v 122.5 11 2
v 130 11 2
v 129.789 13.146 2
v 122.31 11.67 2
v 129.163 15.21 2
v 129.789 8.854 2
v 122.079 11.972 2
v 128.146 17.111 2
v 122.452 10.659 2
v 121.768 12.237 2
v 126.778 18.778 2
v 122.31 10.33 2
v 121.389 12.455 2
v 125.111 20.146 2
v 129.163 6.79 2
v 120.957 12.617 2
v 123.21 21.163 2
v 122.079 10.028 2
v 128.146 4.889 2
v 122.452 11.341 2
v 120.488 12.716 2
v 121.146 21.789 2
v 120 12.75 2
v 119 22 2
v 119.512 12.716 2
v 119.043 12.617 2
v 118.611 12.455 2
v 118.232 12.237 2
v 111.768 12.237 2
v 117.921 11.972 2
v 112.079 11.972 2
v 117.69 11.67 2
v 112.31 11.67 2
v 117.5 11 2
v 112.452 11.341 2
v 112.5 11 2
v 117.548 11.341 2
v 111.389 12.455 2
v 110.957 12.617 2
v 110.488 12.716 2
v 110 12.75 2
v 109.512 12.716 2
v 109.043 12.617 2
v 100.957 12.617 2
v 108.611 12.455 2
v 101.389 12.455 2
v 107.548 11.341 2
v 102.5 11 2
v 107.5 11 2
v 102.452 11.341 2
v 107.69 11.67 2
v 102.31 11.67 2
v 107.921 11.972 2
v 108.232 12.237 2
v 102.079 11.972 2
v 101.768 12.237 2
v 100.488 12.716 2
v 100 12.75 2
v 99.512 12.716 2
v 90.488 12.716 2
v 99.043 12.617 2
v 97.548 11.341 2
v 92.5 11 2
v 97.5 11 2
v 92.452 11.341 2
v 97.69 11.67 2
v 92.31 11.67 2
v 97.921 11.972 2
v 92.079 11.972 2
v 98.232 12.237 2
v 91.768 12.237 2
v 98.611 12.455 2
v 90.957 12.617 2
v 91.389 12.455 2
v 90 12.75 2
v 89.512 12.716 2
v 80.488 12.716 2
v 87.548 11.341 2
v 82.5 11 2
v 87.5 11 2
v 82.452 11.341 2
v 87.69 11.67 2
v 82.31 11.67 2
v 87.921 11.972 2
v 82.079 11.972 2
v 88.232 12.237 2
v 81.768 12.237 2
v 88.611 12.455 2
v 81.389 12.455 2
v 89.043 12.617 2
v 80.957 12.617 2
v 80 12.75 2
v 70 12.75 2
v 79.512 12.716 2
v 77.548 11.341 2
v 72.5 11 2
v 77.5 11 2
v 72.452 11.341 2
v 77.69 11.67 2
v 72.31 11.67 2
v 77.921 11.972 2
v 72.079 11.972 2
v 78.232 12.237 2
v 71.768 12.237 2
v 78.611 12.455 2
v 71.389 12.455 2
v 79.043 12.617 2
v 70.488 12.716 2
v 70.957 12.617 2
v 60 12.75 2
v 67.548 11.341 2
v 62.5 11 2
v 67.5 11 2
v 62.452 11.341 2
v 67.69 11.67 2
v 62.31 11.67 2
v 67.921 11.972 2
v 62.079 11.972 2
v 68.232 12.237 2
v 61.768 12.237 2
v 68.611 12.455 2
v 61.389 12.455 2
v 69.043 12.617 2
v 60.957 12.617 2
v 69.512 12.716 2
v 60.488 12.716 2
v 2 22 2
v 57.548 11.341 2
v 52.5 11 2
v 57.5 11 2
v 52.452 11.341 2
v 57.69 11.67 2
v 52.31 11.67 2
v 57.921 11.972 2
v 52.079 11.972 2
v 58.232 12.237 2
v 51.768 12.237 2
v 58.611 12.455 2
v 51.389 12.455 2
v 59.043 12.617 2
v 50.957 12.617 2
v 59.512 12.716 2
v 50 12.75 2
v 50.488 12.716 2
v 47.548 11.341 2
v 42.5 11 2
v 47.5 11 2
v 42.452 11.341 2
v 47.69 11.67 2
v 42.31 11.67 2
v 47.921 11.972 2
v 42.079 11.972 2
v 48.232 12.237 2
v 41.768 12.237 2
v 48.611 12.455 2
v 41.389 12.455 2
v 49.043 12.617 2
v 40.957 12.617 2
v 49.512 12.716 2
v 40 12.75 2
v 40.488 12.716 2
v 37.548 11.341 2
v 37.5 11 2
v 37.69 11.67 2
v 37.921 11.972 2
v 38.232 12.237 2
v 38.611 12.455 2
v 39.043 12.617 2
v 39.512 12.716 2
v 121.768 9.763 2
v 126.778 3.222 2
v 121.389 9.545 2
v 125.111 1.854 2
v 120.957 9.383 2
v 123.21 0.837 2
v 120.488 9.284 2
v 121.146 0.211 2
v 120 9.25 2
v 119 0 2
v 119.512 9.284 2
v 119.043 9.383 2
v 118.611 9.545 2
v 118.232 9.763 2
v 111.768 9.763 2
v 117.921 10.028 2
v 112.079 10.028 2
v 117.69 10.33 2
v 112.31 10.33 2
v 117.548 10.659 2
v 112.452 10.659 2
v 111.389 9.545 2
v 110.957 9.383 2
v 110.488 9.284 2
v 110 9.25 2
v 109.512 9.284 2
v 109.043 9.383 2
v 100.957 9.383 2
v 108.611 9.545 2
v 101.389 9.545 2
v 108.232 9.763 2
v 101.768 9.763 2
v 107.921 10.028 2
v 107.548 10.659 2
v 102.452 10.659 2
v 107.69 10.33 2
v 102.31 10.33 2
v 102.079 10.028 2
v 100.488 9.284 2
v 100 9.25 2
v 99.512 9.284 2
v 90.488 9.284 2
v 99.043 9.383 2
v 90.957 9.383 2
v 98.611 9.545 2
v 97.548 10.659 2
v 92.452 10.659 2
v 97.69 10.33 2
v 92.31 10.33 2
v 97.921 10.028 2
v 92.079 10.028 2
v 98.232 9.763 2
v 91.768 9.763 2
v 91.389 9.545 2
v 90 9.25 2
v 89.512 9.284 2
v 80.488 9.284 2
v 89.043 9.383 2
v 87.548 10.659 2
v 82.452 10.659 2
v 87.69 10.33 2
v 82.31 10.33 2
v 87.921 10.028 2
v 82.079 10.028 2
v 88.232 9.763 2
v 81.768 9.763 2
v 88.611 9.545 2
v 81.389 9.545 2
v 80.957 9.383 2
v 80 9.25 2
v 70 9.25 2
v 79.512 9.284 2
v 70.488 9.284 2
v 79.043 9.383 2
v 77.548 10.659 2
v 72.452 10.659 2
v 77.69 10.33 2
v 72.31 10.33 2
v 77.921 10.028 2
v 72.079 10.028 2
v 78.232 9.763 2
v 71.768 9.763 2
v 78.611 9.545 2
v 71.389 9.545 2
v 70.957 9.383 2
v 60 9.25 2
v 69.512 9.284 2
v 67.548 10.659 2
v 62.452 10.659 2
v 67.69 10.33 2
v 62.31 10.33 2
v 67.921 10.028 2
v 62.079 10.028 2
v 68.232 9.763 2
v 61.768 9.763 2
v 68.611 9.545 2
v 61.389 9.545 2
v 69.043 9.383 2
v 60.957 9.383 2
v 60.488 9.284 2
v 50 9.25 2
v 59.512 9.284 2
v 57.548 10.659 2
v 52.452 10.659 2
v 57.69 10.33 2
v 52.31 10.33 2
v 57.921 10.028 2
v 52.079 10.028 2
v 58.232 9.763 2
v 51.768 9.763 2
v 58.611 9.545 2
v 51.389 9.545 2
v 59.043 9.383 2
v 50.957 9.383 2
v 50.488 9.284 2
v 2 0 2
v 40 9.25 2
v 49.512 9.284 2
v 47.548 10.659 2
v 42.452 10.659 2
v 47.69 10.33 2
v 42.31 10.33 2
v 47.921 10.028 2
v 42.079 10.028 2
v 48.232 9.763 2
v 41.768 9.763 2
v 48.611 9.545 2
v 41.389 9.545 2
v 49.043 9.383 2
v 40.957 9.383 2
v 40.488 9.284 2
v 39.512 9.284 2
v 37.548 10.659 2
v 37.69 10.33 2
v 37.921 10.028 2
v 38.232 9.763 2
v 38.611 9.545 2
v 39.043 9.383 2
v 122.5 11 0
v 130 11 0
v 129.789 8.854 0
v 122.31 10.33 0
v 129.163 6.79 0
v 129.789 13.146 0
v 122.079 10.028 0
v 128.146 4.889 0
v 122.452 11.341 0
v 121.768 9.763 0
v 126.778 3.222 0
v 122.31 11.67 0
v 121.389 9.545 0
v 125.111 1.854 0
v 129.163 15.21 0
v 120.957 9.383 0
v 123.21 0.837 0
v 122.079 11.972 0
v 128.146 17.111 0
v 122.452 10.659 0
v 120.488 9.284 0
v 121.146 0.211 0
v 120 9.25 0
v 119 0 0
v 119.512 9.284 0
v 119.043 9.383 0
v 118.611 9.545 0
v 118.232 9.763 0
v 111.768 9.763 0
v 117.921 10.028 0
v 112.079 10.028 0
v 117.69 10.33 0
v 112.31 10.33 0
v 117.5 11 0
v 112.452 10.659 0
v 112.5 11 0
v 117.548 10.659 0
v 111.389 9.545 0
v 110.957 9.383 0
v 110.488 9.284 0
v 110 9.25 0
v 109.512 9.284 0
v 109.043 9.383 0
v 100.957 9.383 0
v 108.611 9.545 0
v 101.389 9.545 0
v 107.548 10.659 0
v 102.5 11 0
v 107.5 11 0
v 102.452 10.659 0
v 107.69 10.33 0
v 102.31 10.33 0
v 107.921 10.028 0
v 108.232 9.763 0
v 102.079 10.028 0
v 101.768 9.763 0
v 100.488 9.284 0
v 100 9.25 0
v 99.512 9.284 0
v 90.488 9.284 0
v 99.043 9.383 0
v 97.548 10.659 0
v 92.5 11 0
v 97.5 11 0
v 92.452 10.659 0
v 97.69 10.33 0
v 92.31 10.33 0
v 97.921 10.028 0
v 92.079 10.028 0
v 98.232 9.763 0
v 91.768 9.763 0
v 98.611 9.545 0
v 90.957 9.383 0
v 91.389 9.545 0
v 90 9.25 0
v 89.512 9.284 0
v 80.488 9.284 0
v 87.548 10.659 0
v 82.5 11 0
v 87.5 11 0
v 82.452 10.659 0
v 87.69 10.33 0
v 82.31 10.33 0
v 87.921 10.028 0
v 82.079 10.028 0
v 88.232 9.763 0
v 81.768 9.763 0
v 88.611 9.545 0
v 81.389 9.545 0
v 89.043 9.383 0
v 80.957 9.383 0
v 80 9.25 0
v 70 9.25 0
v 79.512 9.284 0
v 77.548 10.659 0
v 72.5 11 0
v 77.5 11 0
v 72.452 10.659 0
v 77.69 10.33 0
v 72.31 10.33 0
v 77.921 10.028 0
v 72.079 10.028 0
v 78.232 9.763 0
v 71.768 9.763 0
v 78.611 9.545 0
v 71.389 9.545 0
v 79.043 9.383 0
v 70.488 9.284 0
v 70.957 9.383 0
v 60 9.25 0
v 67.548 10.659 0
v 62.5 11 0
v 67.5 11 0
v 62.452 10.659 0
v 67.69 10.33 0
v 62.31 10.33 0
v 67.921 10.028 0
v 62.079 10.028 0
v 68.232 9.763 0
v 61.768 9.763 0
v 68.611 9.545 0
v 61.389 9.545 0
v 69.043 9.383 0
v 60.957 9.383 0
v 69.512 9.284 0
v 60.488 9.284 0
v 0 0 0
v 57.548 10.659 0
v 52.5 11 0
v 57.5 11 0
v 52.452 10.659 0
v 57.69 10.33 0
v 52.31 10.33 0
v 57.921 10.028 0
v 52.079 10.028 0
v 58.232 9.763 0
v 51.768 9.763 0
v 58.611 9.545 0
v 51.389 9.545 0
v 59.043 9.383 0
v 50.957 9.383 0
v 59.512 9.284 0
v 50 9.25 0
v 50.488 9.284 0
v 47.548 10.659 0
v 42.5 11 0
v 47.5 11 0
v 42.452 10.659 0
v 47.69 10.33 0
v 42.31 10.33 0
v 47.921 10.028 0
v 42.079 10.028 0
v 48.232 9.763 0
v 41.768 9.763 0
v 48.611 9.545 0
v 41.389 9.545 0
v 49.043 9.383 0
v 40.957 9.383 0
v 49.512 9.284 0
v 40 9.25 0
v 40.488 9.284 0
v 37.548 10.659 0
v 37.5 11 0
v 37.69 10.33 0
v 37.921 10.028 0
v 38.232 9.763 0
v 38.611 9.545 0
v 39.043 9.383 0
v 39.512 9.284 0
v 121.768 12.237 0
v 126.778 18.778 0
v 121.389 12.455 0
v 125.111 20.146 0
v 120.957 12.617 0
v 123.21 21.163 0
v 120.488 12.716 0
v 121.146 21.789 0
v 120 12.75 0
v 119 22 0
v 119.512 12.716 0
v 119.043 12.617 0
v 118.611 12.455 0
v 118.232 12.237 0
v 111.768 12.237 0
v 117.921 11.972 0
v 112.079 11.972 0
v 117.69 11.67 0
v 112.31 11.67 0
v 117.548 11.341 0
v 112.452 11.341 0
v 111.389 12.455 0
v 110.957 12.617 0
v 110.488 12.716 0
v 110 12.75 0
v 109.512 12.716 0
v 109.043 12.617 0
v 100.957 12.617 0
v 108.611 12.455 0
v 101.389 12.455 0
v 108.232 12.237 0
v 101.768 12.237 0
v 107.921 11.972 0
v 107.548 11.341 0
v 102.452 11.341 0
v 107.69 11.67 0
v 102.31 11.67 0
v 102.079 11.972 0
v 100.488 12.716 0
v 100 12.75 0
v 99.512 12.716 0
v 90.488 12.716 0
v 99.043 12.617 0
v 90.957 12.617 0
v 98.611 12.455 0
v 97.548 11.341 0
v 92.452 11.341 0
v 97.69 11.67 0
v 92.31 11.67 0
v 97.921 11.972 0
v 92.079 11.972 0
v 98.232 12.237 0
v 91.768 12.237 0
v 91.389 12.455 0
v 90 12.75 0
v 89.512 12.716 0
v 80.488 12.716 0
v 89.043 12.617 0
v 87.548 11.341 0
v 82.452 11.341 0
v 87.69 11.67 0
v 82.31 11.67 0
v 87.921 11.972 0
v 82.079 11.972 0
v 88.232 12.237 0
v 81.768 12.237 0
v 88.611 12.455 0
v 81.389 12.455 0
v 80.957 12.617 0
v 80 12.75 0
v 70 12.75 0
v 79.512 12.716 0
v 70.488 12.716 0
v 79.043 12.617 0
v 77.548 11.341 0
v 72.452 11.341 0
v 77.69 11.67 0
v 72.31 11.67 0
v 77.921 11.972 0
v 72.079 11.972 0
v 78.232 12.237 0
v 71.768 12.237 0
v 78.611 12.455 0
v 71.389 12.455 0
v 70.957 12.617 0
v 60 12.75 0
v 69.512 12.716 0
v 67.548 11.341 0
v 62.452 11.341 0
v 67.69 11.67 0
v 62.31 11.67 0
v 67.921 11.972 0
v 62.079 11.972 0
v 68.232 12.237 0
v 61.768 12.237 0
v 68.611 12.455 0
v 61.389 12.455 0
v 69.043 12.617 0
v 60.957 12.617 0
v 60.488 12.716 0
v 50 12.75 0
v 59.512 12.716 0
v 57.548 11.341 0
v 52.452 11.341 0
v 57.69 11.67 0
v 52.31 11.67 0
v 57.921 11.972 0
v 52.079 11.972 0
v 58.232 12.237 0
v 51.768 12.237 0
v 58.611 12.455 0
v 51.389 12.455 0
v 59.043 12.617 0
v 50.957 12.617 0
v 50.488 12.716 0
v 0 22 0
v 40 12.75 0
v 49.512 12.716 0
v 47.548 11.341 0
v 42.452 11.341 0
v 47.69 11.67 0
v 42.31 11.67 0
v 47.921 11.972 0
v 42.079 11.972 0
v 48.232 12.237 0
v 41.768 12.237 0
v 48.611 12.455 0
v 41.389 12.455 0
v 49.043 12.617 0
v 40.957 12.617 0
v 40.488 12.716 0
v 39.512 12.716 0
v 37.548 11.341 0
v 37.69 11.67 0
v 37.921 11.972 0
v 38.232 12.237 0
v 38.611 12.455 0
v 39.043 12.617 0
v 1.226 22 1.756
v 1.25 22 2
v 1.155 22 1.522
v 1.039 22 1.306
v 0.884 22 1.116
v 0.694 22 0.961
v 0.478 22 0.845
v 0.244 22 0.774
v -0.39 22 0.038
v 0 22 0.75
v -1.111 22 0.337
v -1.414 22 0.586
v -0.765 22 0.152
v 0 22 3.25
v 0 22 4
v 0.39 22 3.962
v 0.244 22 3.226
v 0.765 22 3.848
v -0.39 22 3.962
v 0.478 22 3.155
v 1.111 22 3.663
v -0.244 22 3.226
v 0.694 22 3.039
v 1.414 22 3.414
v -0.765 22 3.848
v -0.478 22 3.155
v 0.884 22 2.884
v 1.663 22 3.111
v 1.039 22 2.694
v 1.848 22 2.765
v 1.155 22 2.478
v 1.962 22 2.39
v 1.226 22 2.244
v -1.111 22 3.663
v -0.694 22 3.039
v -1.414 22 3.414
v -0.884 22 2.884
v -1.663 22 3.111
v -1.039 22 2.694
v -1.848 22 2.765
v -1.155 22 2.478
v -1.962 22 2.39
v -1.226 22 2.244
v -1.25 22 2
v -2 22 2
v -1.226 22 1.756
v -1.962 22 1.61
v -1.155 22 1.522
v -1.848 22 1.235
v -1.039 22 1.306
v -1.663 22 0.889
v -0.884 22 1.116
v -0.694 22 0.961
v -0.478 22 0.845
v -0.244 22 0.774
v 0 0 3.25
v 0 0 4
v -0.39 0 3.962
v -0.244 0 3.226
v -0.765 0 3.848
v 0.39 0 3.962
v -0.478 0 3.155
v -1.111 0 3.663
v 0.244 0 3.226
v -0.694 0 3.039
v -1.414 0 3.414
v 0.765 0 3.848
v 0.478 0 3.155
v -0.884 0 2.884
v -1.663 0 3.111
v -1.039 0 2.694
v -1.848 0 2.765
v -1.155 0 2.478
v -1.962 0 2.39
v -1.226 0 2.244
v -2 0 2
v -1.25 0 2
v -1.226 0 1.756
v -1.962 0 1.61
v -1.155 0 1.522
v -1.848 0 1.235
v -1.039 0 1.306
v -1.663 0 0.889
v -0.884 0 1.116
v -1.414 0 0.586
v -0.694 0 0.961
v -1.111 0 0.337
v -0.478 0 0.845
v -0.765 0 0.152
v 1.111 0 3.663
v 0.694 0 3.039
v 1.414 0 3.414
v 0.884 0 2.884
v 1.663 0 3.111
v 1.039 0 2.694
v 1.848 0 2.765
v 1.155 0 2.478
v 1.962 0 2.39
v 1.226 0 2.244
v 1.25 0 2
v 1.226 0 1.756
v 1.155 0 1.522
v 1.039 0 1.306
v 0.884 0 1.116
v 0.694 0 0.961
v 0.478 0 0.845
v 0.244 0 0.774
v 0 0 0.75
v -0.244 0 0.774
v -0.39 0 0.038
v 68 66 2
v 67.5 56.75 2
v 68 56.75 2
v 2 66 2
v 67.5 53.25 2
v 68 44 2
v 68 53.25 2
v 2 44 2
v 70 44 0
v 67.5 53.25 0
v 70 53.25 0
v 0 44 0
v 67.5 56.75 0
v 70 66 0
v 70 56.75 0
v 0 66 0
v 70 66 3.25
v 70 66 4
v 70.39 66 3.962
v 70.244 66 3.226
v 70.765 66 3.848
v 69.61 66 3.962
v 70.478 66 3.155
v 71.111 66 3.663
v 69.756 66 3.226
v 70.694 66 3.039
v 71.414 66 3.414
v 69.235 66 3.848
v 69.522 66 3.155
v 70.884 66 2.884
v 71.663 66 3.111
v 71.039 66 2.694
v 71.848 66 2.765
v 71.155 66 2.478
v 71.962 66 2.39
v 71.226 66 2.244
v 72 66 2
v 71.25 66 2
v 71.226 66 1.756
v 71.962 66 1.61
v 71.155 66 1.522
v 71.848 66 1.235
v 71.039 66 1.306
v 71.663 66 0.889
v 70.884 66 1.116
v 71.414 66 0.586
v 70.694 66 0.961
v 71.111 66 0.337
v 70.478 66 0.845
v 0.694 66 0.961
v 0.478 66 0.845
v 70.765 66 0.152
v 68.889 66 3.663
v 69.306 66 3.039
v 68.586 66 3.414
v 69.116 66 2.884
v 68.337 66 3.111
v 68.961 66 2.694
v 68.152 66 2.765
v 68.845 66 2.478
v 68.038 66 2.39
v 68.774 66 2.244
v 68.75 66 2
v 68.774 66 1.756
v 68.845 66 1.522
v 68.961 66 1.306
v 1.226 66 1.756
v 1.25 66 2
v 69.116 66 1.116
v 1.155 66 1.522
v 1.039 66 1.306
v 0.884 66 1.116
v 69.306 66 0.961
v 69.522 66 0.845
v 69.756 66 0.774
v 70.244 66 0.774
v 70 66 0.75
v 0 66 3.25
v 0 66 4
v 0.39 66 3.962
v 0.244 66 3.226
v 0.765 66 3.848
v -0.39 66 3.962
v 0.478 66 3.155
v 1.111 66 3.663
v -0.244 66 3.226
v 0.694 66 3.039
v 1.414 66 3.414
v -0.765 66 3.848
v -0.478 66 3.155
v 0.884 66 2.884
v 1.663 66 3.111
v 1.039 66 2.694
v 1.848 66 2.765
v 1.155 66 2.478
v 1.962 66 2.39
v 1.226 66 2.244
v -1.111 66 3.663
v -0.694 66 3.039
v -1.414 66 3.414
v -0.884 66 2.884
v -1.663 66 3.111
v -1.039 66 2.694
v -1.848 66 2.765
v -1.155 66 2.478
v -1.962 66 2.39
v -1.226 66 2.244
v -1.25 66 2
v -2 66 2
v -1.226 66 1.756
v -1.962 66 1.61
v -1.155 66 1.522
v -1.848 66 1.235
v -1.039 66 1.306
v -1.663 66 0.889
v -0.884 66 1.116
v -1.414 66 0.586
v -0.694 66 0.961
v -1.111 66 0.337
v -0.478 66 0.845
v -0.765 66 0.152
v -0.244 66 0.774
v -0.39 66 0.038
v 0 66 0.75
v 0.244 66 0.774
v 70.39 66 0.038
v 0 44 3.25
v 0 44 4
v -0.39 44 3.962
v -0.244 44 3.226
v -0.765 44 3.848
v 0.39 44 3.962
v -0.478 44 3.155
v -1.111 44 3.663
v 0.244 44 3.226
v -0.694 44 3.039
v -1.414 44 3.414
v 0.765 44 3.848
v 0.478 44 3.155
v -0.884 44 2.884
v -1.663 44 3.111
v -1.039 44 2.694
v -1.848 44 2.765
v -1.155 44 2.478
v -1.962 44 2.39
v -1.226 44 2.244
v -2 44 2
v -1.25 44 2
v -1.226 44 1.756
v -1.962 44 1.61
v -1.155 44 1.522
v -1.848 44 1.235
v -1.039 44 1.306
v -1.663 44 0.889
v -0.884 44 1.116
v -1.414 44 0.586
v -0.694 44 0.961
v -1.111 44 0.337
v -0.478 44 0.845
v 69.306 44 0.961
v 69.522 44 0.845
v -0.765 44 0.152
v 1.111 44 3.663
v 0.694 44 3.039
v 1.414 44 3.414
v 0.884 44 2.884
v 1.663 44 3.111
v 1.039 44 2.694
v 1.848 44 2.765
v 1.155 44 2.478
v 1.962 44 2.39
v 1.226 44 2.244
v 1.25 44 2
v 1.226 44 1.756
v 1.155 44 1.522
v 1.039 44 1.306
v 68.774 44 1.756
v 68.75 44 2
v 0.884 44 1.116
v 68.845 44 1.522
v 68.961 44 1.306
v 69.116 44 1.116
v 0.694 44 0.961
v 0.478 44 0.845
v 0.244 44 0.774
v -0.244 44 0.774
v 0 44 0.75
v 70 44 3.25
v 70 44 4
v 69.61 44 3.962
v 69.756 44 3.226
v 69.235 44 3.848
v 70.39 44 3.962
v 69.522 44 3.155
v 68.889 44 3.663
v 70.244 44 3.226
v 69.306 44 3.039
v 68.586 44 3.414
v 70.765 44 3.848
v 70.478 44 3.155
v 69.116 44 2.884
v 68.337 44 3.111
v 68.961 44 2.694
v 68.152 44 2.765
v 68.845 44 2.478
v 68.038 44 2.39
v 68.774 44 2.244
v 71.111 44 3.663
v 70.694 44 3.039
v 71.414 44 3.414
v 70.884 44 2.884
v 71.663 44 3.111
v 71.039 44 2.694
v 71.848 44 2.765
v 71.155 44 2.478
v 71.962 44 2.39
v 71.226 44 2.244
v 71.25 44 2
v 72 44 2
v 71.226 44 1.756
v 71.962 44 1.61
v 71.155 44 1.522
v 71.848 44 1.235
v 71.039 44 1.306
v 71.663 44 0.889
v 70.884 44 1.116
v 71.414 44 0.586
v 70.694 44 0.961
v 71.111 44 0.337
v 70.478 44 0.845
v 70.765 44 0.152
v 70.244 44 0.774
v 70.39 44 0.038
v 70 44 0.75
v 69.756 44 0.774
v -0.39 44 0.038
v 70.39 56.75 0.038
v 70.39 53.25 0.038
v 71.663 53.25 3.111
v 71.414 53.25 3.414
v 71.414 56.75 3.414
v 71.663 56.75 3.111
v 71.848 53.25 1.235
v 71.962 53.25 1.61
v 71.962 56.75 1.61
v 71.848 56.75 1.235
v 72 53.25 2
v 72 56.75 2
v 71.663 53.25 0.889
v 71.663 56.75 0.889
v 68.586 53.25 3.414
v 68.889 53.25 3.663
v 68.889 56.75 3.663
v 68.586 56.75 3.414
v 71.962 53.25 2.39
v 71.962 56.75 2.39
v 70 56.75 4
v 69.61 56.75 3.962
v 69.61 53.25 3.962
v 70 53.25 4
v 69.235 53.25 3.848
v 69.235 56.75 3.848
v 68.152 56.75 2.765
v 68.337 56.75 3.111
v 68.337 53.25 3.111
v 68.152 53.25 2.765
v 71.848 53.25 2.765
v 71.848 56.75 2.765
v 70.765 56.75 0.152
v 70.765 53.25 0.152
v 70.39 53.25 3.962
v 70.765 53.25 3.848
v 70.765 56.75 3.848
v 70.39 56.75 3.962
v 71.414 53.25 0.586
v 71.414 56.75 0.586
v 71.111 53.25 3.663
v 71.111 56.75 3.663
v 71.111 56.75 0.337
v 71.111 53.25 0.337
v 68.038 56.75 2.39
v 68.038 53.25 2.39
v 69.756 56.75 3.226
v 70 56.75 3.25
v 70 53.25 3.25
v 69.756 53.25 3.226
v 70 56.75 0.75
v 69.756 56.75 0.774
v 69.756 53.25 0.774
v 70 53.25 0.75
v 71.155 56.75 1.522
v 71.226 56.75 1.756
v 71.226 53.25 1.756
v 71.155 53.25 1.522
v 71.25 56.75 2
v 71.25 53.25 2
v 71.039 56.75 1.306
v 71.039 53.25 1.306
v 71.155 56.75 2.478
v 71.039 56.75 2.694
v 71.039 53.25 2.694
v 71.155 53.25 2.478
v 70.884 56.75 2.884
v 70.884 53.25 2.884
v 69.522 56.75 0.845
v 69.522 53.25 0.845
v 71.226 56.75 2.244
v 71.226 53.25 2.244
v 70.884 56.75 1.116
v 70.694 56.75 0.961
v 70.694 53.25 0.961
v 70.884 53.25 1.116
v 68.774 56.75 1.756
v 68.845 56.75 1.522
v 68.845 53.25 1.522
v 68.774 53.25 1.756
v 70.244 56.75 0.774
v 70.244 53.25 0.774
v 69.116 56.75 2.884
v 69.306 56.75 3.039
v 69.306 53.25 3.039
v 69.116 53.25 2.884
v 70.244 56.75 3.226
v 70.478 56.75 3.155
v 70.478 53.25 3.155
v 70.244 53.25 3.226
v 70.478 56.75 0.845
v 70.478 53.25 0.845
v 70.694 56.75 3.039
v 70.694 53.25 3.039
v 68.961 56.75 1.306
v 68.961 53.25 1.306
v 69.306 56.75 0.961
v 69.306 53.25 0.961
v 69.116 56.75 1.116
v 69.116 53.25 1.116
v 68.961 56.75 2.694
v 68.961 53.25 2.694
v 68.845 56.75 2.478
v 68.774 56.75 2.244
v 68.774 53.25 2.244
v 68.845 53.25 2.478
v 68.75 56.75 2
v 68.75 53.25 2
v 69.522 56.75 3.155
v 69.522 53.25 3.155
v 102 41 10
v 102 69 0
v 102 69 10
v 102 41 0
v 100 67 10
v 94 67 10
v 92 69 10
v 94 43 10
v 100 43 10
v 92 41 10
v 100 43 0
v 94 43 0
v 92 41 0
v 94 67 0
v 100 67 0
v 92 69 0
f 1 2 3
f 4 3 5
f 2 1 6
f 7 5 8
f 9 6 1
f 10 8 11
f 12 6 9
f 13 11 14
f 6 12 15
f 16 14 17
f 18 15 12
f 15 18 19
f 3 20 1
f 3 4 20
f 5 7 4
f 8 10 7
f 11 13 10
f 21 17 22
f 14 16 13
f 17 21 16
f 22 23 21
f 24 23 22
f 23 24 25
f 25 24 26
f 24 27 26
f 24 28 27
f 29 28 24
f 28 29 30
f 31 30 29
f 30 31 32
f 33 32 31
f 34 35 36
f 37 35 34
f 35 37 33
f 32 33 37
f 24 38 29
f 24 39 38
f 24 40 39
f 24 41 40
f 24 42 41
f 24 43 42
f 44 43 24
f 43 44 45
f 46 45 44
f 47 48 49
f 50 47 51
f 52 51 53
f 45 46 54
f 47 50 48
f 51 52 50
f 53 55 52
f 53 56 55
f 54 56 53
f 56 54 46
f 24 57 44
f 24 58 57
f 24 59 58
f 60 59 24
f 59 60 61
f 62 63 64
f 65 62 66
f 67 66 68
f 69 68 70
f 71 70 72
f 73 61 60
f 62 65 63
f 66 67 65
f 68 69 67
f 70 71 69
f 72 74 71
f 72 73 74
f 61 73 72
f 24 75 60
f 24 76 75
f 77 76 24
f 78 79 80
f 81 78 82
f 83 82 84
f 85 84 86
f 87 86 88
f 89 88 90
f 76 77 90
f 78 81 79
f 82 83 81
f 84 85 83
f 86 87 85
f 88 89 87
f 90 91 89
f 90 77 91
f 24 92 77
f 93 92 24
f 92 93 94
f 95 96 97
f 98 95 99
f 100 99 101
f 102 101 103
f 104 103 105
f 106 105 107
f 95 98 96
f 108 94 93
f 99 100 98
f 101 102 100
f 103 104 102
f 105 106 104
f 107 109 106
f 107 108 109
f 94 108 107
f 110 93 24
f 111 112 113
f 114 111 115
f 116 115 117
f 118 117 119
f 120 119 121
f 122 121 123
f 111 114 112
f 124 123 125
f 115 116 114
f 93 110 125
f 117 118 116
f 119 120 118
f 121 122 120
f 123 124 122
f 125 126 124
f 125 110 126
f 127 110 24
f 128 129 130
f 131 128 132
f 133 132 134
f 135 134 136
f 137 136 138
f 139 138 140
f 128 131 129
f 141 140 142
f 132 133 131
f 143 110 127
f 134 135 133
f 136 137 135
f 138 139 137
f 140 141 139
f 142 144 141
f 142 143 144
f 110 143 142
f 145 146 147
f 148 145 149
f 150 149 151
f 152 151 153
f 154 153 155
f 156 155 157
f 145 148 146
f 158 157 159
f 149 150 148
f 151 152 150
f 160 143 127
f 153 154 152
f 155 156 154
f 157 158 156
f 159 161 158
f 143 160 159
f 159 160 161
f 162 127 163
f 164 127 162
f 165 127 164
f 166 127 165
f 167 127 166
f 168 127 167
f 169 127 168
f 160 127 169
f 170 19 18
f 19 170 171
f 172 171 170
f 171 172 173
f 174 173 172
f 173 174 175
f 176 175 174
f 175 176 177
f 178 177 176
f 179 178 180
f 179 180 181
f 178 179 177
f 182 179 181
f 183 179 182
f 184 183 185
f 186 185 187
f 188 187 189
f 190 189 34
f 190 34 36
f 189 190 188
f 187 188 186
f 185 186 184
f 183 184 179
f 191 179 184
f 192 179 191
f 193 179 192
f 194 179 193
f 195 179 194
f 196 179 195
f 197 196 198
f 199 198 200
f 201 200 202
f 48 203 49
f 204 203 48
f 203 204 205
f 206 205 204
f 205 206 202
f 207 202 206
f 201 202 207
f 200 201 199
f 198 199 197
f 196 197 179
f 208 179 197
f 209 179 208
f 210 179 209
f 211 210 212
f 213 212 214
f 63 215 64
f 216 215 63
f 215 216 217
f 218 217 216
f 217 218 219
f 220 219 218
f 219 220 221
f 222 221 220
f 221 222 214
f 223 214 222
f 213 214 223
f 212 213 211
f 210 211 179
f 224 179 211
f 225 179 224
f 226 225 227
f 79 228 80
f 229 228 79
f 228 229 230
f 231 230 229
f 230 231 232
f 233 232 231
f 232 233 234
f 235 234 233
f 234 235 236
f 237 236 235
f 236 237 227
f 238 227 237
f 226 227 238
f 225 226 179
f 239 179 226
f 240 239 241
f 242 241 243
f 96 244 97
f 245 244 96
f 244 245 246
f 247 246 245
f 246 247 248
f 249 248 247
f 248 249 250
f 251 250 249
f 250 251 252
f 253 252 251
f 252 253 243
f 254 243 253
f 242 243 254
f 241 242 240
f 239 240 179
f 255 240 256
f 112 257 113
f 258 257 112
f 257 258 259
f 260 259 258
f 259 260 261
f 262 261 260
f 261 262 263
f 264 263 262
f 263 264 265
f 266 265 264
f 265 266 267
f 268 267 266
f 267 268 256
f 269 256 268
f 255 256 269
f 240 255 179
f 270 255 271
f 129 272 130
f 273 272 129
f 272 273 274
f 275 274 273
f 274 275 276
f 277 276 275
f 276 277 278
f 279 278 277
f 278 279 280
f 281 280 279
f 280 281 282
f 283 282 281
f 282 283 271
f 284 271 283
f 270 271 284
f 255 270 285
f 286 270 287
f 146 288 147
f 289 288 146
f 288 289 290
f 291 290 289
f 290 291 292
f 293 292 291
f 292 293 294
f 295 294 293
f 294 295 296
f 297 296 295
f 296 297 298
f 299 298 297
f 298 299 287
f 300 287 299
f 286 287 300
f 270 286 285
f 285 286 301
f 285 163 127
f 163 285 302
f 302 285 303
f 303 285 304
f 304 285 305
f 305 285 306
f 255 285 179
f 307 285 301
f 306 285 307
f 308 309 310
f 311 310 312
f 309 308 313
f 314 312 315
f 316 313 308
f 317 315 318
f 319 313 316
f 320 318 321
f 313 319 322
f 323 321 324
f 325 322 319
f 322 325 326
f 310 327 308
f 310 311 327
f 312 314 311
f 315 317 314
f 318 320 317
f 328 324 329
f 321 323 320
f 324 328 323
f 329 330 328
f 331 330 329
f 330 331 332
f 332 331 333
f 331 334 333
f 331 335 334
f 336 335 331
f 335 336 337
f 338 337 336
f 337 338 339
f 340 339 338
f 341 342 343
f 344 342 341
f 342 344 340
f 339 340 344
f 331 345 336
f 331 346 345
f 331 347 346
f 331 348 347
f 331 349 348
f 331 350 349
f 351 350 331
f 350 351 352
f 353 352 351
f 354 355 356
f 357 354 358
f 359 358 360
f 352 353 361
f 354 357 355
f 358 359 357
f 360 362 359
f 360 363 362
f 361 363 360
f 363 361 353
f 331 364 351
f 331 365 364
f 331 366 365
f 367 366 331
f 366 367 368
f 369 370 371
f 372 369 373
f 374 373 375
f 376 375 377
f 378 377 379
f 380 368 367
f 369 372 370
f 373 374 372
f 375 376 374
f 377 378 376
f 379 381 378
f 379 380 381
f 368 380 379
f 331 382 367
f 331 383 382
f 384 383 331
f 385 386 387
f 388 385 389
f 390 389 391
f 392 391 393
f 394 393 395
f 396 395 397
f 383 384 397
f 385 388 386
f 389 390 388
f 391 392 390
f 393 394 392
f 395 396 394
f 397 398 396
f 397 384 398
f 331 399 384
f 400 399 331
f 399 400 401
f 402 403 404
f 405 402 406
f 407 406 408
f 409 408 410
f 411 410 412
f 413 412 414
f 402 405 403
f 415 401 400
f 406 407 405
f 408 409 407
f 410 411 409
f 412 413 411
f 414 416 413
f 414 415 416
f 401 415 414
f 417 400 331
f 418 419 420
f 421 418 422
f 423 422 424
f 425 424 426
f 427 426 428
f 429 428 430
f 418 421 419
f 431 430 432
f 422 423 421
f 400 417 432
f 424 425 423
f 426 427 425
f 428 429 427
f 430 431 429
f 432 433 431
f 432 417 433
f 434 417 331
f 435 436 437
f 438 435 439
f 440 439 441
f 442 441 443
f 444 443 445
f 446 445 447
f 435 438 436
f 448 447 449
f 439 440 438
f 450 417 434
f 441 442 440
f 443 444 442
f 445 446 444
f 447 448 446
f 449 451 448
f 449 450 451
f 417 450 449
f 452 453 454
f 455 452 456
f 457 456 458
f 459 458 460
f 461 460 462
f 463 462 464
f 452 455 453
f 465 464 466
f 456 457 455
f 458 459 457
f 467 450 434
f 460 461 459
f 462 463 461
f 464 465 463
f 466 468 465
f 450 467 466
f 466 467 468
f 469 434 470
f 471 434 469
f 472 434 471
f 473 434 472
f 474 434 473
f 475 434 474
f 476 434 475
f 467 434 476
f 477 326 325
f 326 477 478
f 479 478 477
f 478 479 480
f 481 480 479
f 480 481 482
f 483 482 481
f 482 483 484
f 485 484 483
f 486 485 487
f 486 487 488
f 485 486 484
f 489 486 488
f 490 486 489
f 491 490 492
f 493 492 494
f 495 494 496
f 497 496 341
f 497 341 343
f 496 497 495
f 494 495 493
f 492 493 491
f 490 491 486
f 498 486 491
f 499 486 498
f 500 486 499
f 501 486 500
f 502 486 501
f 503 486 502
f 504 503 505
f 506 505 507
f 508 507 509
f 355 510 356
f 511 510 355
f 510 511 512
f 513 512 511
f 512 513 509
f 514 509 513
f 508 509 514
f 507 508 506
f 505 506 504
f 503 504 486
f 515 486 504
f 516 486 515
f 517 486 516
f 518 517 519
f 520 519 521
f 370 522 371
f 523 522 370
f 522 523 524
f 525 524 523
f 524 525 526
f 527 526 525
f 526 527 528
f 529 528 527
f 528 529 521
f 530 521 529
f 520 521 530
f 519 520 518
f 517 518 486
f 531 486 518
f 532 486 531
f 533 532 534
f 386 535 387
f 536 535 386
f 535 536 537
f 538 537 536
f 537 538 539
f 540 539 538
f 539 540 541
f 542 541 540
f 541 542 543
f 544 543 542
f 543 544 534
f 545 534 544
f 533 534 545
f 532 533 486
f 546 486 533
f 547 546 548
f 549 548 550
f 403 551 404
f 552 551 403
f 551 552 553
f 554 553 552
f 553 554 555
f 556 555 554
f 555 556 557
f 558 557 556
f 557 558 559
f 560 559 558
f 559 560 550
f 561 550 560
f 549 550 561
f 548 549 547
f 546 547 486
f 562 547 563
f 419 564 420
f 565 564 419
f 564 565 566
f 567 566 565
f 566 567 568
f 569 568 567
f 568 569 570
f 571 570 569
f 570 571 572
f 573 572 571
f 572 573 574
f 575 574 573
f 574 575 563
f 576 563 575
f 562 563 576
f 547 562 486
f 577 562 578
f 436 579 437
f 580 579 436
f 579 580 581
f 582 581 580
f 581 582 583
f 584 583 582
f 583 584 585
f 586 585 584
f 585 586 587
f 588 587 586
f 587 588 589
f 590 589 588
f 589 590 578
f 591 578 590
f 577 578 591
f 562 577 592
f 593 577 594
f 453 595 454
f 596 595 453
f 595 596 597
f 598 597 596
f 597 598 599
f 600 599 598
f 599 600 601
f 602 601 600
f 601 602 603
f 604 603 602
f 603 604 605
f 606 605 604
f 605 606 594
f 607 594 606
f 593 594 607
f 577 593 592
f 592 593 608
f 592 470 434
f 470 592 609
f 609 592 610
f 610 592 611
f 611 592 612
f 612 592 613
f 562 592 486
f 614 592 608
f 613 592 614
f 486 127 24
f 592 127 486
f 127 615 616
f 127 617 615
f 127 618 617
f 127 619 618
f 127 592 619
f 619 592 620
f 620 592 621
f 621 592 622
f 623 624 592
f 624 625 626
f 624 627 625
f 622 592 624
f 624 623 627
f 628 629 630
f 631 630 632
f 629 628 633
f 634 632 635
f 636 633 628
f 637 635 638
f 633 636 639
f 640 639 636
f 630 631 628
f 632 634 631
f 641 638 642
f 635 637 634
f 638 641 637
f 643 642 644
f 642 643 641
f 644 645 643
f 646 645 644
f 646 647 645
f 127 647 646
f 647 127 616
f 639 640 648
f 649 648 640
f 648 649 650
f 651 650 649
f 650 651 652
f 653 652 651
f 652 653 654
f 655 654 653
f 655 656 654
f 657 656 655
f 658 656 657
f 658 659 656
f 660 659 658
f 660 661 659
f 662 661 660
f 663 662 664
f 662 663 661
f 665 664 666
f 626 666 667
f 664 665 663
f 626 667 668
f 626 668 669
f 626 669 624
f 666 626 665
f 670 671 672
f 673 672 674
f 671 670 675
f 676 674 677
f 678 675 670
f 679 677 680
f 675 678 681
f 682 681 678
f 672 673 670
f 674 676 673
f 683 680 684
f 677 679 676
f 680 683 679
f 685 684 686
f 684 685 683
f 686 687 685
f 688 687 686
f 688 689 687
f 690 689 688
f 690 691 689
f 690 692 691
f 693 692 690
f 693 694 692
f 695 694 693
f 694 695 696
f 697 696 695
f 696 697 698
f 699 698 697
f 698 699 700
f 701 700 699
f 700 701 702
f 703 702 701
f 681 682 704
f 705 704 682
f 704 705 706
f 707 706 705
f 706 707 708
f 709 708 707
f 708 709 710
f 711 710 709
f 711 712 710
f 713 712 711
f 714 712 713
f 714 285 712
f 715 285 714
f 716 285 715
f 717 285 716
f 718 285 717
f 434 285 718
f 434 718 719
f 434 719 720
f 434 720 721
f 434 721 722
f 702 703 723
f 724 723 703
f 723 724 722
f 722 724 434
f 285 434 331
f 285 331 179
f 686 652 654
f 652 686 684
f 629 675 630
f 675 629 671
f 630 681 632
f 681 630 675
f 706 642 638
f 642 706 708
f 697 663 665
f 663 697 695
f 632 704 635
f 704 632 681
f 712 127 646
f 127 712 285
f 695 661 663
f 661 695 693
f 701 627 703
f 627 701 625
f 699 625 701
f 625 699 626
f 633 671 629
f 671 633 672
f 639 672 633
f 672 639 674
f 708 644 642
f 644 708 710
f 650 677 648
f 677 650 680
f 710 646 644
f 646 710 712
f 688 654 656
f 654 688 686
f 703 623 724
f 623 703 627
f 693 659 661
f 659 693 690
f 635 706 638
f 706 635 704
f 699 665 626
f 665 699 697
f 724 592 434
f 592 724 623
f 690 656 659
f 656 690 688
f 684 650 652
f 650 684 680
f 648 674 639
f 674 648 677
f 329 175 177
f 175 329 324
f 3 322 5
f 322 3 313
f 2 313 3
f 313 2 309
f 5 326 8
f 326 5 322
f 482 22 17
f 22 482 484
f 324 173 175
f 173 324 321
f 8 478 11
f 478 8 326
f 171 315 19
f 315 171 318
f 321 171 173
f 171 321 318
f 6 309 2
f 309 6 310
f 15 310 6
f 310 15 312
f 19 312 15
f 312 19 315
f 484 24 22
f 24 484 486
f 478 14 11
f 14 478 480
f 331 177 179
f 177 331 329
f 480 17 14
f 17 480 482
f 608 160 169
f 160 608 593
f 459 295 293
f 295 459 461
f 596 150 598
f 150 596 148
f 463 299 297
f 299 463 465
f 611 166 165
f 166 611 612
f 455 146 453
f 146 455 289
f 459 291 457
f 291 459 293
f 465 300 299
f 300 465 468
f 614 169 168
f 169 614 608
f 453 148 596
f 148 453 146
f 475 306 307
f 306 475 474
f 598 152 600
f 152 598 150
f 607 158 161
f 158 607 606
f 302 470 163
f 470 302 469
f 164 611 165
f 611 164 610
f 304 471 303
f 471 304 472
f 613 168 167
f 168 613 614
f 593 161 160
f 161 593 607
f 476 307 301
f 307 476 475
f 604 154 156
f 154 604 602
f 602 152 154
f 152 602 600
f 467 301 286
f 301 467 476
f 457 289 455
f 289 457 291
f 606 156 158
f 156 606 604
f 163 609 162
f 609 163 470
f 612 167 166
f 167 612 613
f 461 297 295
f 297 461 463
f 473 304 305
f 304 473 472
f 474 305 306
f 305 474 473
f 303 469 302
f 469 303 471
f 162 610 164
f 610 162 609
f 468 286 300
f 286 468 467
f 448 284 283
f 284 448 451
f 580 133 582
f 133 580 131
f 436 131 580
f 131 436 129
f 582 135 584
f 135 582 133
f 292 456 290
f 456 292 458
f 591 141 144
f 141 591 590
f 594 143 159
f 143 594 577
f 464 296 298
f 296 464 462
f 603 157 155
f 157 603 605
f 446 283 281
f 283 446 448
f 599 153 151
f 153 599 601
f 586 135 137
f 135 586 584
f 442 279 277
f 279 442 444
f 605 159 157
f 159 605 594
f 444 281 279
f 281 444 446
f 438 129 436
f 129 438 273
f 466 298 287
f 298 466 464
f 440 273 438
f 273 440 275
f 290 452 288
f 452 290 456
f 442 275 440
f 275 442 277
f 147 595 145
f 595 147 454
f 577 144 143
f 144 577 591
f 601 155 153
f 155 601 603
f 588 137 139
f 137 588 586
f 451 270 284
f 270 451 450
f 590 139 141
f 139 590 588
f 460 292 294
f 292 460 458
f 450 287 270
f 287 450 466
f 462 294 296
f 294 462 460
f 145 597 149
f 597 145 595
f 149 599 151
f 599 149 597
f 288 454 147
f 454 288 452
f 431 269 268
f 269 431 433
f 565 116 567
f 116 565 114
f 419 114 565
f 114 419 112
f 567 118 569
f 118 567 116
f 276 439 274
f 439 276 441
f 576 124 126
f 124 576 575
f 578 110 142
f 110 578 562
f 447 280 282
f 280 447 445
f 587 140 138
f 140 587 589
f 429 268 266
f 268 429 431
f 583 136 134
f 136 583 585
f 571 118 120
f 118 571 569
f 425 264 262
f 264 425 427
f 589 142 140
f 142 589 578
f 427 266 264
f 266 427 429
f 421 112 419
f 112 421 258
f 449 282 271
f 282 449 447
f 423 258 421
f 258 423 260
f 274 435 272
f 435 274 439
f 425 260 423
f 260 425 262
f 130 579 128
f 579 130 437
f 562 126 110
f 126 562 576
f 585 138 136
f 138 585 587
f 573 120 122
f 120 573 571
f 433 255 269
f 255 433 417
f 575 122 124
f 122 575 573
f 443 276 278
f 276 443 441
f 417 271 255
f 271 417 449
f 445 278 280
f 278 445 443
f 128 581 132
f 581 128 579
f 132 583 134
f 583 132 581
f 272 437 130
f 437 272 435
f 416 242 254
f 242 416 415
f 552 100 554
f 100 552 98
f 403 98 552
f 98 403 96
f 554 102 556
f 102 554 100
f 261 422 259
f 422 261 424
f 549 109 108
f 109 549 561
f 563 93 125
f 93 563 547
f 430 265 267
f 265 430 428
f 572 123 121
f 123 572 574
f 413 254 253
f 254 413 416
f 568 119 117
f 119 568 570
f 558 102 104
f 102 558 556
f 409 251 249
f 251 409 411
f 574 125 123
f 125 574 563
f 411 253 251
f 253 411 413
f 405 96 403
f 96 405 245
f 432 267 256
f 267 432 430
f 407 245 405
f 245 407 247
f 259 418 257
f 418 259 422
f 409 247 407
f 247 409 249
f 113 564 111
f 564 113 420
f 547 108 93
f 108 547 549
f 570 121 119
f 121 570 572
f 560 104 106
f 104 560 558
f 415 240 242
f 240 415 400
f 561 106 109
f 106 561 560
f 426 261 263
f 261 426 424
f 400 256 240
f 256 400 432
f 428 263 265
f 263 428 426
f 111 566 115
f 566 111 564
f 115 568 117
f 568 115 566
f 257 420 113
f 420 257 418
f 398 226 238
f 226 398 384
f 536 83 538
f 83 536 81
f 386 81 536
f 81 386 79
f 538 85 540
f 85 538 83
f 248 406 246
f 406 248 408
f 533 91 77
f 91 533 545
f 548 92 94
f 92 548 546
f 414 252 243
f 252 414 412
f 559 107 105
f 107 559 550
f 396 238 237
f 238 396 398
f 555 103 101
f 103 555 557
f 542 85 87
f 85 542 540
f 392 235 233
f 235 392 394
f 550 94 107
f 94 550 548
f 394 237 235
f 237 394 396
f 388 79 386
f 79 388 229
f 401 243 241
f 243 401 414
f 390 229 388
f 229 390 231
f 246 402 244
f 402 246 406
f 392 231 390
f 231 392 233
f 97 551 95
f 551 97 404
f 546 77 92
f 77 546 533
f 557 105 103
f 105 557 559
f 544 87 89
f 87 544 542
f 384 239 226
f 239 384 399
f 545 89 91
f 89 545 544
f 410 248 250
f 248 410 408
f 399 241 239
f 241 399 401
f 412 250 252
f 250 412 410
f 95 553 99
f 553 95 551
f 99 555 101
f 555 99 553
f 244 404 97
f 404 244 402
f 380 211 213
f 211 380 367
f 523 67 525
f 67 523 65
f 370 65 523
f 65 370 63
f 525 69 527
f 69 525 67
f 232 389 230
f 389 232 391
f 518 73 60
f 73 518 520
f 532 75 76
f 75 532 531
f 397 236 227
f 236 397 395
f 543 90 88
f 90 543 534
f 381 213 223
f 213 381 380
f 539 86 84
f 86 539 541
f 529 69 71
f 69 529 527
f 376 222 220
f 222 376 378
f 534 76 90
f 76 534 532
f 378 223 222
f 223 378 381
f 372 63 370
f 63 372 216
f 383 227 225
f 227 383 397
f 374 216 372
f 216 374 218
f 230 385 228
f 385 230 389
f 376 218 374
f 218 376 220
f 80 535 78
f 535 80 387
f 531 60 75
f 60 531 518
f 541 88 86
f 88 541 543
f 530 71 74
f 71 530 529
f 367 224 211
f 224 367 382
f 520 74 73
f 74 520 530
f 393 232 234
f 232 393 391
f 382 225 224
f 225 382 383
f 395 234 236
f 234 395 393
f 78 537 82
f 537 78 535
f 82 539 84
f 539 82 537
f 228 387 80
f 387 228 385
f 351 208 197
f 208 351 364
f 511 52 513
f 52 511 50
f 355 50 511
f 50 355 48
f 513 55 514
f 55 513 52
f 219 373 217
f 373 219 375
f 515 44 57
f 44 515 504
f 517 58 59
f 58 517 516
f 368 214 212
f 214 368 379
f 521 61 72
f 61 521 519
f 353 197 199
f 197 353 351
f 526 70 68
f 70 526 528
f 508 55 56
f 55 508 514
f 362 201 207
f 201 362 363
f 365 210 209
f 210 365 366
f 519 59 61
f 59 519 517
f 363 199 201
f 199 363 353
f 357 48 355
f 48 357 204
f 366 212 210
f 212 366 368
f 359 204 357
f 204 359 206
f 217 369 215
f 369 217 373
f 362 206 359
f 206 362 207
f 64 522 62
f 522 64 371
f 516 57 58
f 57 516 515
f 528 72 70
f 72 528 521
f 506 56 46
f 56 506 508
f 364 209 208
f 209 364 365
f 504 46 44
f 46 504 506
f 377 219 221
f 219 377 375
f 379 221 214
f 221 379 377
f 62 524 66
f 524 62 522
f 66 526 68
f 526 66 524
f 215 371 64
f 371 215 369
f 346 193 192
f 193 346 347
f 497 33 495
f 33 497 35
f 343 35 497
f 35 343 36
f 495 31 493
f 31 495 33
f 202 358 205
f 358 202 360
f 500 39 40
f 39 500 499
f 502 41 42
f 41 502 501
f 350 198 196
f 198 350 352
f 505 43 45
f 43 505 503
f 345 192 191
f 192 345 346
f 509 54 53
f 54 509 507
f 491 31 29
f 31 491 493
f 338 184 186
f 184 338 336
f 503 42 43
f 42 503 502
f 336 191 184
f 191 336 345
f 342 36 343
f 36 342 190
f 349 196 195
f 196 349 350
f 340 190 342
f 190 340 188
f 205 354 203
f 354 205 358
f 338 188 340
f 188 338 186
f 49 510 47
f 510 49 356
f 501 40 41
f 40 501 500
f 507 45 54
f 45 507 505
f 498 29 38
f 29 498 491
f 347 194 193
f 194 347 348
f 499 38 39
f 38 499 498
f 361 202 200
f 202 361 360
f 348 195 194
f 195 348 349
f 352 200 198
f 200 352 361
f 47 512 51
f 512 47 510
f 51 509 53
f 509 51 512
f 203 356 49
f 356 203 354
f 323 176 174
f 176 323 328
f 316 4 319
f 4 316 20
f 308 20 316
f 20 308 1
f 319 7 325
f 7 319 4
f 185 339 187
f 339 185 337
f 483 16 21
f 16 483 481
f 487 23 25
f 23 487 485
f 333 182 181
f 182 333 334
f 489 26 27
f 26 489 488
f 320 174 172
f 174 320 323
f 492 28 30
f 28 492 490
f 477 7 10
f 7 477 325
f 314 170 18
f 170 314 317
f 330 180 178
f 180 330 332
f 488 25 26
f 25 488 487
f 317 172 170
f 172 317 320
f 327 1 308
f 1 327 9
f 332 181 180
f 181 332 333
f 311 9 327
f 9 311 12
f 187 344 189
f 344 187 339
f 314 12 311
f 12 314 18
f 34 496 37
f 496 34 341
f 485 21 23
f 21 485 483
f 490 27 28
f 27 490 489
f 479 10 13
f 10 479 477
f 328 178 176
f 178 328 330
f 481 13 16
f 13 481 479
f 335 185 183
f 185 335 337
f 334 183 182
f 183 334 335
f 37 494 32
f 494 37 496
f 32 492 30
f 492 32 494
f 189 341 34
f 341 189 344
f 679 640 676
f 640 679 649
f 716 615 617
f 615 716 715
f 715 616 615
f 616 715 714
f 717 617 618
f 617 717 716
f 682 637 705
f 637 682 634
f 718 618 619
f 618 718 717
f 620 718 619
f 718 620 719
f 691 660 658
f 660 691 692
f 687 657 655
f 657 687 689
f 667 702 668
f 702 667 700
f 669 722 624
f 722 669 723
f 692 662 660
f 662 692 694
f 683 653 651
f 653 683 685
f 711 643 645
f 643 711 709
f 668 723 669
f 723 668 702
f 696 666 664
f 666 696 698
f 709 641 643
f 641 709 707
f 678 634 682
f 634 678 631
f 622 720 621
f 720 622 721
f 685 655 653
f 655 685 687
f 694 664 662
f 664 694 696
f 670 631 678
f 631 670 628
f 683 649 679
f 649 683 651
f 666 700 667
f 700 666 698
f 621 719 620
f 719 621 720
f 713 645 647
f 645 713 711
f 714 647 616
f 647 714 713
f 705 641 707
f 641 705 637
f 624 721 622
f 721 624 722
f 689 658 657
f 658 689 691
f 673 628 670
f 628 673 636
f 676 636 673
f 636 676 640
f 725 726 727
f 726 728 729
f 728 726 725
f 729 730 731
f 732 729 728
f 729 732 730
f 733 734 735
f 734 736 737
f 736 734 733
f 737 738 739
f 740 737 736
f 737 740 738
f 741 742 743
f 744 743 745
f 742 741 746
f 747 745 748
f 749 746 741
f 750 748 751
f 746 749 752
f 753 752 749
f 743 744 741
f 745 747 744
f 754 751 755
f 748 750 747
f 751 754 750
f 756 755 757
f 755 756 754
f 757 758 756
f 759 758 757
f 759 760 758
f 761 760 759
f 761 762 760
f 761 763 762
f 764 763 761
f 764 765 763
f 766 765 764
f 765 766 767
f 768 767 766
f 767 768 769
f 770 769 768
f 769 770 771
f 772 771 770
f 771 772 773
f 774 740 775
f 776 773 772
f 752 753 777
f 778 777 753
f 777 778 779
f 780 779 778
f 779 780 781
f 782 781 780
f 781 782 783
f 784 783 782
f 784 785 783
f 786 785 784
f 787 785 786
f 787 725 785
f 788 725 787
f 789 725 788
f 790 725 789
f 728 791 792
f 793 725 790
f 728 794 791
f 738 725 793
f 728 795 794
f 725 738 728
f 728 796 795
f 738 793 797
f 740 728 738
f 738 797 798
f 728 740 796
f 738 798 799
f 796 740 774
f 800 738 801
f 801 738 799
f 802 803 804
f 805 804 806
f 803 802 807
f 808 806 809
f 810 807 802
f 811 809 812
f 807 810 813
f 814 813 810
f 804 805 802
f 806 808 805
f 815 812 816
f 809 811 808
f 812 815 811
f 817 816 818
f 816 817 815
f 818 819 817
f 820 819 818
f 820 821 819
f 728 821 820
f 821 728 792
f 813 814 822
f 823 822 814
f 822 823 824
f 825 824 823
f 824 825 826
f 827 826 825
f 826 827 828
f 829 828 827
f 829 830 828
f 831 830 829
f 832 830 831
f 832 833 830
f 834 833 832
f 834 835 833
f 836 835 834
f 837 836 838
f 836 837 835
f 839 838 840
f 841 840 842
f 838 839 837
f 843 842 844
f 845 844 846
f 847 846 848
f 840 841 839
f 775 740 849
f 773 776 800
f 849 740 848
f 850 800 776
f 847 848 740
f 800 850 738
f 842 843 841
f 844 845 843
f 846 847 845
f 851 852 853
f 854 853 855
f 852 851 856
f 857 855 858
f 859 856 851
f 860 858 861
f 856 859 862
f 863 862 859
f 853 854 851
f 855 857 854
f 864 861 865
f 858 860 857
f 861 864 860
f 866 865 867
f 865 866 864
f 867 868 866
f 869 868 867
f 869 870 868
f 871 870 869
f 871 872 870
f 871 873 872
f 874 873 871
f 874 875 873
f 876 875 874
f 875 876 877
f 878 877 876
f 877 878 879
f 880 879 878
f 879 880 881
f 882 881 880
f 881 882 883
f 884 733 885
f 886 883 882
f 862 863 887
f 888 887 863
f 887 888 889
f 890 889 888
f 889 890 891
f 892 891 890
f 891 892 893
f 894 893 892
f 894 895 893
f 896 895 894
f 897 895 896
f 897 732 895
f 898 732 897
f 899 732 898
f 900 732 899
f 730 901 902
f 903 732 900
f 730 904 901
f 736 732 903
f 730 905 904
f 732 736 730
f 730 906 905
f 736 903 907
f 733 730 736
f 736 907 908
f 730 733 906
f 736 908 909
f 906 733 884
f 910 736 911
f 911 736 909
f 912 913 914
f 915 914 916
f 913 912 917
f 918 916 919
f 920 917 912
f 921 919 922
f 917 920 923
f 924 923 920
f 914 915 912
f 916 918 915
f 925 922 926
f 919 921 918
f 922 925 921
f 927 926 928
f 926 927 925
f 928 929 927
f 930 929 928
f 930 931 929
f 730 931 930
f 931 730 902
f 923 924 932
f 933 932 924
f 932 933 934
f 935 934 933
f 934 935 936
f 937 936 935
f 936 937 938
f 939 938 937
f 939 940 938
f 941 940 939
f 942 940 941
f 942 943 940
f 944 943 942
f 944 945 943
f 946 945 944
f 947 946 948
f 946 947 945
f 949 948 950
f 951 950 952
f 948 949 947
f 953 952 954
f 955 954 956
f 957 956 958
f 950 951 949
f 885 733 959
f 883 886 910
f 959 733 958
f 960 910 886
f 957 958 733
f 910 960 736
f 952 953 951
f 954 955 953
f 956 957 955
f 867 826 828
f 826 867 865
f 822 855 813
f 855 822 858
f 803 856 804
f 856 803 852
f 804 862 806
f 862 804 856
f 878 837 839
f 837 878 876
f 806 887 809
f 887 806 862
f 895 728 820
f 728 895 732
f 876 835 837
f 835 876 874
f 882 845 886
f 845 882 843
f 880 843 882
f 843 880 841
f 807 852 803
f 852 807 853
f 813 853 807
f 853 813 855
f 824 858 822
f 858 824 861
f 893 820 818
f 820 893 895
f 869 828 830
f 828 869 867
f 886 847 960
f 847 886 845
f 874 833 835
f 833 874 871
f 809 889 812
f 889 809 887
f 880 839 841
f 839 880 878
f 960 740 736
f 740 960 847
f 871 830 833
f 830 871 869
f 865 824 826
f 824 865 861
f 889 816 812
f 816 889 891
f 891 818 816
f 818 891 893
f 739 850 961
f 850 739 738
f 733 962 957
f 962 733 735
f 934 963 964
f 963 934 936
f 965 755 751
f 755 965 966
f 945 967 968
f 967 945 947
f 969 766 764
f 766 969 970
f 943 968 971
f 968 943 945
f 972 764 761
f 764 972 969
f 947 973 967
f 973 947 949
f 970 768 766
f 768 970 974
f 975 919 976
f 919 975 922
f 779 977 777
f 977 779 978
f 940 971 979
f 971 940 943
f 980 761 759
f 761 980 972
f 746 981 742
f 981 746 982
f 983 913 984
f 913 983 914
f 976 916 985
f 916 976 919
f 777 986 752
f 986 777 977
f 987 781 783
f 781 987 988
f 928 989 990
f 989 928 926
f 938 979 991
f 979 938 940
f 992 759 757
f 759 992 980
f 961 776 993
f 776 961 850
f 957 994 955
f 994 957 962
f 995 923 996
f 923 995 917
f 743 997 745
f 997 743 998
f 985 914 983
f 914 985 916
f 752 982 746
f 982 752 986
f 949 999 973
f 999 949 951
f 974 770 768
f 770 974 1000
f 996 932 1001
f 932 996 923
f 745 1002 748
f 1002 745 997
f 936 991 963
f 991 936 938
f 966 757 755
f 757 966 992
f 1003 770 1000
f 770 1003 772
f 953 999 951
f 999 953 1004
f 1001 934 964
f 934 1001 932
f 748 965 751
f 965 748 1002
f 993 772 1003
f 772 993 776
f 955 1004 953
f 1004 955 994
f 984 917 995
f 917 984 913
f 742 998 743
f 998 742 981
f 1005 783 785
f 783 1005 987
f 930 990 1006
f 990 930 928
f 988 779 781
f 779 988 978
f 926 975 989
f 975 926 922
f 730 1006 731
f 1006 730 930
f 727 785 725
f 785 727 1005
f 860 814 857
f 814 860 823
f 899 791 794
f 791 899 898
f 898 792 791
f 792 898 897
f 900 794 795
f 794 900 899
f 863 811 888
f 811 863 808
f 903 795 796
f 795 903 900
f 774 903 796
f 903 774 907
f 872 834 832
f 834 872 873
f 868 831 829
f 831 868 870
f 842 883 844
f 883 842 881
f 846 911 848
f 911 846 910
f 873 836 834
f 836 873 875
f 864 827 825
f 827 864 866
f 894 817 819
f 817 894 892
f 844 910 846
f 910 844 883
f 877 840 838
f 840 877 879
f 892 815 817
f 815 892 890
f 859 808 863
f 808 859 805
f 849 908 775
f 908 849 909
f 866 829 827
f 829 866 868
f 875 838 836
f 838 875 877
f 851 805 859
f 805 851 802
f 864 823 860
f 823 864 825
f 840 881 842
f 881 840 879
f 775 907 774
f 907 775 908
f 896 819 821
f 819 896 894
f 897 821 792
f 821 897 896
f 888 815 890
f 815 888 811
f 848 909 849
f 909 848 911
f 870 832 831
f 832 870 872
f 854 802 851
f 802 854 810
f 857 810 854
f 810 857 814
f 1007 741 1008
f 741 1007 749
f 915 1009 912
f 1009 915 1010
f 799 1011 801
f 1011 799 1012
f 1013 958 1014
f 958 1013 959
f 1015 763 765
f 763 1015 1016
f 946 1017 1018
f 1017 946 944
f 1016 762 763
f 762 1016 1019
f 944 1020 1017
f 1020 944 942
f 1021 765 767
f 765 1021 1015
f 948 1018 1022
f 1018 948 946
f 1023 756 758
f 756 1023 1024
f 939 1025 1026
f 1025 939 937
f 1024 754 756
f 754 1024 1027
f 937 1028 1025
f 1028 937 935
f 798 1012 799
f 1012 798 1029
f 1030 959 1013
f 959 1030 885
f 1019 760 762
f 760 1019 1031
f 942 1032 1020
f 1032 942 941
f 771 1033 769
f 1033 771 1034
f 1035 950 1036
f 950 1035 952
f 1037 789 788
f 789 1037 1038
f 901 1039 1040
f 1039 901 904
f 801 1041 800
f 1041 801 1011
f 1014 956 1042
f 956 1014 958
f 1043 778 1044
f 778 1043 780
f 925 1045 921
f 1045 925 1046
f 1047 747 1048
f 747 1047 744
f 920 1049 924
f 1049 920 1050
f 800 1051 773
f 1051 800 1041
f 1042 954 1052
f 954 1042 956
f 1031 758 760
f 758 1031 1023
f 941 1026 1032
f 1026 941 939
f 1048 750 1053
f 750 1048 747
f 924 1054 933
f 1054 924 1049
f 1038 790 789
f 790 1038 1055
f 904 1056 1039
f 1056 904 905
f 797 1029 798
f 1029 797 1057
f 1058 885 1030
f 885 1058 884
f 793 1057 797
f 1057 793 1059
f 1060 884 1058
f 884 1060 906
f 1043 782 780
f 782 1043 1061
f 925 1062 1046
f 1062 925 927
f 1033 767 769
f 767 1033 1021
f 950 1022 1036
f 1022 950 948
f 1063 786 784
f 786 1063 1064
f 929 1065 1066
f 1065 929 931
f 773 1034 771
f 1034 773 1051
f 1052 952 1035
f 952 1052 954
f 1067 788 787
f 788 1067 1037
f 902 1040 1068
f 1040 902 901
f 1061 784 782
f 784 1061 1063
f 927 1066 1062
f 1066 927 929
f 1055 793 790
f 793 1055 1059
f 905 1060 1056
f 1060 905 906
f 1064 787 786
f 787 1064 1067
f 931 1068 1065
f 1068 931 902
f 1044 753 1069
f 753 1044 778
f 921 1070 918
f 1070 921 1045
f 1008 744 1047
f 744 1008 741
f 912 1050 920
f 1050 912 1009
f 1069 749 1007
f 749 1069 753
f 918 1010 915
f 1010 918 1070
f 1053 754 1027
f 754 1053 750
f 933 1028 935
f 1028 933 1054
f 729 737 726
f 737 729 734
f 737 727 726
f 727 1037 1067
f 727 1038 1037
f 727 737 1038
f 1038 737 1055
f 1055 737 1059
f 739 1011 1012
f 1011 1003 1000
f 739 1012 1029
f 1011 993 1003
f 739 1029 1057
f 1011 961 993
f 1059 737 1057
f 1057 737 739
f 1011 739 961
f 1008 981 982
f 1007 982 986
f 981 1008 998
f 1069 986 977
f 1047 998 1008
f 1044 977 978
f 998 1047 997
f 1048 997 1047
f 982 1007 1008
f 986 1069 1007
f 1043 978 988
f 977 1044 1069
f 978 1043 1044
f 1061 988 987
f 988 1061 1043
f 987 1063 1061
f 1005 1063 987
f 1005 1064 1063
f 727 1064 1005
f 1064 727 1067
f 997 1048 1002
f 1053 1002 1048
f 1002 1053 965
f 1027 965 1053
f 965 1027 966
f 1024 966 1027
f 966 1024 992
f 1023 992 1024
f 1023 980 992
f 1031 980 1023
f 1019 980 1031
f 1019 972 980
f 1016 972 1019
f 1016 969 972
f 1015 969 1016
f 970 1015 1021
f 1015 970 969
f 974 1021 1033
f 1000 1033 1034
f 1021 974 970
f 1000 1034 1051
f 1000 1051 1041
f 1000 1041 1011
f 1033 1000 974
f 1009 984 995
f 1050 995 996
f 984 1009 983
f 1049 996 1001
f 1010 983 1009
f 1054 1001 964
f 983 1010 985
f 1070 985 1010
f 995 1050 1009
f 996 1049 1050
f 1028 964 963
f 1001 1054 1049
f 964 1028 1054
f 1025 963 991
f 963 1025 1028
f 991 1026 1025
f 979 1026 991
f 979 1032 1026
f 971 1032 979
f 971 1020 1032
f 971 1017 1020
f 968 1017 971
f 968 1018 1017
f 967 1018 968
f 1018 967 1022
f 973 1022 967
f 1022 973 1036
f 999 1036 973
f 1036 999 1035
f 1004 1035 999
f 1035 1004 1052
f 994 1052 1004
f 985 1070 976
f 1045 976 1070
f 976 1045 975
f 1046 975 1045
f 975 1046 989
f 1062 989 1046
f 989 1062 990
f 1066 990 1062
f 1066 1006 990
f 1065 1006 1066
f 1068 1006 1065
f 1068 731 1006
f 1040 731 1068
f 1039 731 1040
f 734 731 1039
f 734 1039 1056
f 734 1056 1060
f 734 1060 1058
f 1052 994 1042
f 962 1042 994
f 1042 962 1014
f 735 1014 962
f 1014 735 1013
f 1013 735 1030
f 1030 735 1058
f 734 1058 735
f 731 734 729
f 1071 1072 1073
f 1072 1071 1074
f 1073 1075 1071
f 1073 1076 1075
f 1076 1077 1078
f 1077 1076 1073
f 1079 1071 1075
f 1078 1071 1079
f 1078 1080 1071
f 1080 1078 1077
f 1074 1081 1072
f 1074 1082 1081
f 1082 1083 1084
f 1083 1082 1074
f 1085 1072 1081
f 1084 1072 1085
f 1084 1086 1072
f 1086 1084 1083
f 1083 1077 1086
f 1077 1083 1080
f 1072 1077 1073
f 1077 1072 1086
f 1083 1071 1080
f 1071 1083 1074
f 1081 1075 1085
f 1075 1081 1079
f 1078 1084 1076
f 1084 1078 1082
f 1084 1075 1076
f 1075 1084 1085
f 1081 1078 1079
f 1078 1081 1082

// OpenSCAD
$fn=32;

// Length of "tongue" band
l=130;
// Length of "buckle" band
lr=70;
// Width
w=22;
w2=w/2;
// Thickness
t=2*1;

module left() { // strap end with holes
    difference() {
        union() {
            cube([l-w2,w,t]); // strap
            translate([0,0,t])rotate([-90,0,0]) cylinder(r=t,h=w); // around watch pin
            translate([l-w2,w2,0]) cylinder(r=w2,h=t); // round end
            }

        translate([0,-1,t]) rotate([-90,0,0]) cylinder(r=1.25, h=w+2);

        // Punch holes
        for (x=[40:10:l-1]) 
            translate([x,w2,-1]) scale([1,.7,1]) cylinder(r=2.5,h=t+3);
        }
    }
    
module right() {
    difference() {
        union() {
            cube([lr,w,2]); // strap
            translate([0,0,t])rotate([-90,0,0]) cylinder(r=t,h=w); // around watch pin
            translate([lr,0,t])rotate([-90,0,0]) cylinder(r=t,h=w); // around watch pin
            }

        translate([0,-1,t]) rotate([-90,0,0]) cylinder(r=1.25, h=w+2);
        translate([lr,-1,t]) rotate([-90,0,0]) cylinder(r=1.25, h=w+2);

        // Punch holes
        translate([lr,w2,t]) scale([1,.7,1]) cube([5,5,5], center=true);//  cylinder(r=2.5,h=t+3);
        //translate([lr+t,w2,-1]) scale([1,.7,1]) cylinder(r=2.5,h=t+3);
        }
    }
    
module hold() {
    translate([0,-t-1,0]) difference() {
        cube([4*t+2,w+2*t+2,10]);
        translate([t,t,-1]) cube([2*t+2,w+2,10+2]);
        }
    }
    
module band() {
    left();
    translate([0,2*w,0]) right();
    translate([lr+w,2*w,0]) hold();
    }
    
band();
